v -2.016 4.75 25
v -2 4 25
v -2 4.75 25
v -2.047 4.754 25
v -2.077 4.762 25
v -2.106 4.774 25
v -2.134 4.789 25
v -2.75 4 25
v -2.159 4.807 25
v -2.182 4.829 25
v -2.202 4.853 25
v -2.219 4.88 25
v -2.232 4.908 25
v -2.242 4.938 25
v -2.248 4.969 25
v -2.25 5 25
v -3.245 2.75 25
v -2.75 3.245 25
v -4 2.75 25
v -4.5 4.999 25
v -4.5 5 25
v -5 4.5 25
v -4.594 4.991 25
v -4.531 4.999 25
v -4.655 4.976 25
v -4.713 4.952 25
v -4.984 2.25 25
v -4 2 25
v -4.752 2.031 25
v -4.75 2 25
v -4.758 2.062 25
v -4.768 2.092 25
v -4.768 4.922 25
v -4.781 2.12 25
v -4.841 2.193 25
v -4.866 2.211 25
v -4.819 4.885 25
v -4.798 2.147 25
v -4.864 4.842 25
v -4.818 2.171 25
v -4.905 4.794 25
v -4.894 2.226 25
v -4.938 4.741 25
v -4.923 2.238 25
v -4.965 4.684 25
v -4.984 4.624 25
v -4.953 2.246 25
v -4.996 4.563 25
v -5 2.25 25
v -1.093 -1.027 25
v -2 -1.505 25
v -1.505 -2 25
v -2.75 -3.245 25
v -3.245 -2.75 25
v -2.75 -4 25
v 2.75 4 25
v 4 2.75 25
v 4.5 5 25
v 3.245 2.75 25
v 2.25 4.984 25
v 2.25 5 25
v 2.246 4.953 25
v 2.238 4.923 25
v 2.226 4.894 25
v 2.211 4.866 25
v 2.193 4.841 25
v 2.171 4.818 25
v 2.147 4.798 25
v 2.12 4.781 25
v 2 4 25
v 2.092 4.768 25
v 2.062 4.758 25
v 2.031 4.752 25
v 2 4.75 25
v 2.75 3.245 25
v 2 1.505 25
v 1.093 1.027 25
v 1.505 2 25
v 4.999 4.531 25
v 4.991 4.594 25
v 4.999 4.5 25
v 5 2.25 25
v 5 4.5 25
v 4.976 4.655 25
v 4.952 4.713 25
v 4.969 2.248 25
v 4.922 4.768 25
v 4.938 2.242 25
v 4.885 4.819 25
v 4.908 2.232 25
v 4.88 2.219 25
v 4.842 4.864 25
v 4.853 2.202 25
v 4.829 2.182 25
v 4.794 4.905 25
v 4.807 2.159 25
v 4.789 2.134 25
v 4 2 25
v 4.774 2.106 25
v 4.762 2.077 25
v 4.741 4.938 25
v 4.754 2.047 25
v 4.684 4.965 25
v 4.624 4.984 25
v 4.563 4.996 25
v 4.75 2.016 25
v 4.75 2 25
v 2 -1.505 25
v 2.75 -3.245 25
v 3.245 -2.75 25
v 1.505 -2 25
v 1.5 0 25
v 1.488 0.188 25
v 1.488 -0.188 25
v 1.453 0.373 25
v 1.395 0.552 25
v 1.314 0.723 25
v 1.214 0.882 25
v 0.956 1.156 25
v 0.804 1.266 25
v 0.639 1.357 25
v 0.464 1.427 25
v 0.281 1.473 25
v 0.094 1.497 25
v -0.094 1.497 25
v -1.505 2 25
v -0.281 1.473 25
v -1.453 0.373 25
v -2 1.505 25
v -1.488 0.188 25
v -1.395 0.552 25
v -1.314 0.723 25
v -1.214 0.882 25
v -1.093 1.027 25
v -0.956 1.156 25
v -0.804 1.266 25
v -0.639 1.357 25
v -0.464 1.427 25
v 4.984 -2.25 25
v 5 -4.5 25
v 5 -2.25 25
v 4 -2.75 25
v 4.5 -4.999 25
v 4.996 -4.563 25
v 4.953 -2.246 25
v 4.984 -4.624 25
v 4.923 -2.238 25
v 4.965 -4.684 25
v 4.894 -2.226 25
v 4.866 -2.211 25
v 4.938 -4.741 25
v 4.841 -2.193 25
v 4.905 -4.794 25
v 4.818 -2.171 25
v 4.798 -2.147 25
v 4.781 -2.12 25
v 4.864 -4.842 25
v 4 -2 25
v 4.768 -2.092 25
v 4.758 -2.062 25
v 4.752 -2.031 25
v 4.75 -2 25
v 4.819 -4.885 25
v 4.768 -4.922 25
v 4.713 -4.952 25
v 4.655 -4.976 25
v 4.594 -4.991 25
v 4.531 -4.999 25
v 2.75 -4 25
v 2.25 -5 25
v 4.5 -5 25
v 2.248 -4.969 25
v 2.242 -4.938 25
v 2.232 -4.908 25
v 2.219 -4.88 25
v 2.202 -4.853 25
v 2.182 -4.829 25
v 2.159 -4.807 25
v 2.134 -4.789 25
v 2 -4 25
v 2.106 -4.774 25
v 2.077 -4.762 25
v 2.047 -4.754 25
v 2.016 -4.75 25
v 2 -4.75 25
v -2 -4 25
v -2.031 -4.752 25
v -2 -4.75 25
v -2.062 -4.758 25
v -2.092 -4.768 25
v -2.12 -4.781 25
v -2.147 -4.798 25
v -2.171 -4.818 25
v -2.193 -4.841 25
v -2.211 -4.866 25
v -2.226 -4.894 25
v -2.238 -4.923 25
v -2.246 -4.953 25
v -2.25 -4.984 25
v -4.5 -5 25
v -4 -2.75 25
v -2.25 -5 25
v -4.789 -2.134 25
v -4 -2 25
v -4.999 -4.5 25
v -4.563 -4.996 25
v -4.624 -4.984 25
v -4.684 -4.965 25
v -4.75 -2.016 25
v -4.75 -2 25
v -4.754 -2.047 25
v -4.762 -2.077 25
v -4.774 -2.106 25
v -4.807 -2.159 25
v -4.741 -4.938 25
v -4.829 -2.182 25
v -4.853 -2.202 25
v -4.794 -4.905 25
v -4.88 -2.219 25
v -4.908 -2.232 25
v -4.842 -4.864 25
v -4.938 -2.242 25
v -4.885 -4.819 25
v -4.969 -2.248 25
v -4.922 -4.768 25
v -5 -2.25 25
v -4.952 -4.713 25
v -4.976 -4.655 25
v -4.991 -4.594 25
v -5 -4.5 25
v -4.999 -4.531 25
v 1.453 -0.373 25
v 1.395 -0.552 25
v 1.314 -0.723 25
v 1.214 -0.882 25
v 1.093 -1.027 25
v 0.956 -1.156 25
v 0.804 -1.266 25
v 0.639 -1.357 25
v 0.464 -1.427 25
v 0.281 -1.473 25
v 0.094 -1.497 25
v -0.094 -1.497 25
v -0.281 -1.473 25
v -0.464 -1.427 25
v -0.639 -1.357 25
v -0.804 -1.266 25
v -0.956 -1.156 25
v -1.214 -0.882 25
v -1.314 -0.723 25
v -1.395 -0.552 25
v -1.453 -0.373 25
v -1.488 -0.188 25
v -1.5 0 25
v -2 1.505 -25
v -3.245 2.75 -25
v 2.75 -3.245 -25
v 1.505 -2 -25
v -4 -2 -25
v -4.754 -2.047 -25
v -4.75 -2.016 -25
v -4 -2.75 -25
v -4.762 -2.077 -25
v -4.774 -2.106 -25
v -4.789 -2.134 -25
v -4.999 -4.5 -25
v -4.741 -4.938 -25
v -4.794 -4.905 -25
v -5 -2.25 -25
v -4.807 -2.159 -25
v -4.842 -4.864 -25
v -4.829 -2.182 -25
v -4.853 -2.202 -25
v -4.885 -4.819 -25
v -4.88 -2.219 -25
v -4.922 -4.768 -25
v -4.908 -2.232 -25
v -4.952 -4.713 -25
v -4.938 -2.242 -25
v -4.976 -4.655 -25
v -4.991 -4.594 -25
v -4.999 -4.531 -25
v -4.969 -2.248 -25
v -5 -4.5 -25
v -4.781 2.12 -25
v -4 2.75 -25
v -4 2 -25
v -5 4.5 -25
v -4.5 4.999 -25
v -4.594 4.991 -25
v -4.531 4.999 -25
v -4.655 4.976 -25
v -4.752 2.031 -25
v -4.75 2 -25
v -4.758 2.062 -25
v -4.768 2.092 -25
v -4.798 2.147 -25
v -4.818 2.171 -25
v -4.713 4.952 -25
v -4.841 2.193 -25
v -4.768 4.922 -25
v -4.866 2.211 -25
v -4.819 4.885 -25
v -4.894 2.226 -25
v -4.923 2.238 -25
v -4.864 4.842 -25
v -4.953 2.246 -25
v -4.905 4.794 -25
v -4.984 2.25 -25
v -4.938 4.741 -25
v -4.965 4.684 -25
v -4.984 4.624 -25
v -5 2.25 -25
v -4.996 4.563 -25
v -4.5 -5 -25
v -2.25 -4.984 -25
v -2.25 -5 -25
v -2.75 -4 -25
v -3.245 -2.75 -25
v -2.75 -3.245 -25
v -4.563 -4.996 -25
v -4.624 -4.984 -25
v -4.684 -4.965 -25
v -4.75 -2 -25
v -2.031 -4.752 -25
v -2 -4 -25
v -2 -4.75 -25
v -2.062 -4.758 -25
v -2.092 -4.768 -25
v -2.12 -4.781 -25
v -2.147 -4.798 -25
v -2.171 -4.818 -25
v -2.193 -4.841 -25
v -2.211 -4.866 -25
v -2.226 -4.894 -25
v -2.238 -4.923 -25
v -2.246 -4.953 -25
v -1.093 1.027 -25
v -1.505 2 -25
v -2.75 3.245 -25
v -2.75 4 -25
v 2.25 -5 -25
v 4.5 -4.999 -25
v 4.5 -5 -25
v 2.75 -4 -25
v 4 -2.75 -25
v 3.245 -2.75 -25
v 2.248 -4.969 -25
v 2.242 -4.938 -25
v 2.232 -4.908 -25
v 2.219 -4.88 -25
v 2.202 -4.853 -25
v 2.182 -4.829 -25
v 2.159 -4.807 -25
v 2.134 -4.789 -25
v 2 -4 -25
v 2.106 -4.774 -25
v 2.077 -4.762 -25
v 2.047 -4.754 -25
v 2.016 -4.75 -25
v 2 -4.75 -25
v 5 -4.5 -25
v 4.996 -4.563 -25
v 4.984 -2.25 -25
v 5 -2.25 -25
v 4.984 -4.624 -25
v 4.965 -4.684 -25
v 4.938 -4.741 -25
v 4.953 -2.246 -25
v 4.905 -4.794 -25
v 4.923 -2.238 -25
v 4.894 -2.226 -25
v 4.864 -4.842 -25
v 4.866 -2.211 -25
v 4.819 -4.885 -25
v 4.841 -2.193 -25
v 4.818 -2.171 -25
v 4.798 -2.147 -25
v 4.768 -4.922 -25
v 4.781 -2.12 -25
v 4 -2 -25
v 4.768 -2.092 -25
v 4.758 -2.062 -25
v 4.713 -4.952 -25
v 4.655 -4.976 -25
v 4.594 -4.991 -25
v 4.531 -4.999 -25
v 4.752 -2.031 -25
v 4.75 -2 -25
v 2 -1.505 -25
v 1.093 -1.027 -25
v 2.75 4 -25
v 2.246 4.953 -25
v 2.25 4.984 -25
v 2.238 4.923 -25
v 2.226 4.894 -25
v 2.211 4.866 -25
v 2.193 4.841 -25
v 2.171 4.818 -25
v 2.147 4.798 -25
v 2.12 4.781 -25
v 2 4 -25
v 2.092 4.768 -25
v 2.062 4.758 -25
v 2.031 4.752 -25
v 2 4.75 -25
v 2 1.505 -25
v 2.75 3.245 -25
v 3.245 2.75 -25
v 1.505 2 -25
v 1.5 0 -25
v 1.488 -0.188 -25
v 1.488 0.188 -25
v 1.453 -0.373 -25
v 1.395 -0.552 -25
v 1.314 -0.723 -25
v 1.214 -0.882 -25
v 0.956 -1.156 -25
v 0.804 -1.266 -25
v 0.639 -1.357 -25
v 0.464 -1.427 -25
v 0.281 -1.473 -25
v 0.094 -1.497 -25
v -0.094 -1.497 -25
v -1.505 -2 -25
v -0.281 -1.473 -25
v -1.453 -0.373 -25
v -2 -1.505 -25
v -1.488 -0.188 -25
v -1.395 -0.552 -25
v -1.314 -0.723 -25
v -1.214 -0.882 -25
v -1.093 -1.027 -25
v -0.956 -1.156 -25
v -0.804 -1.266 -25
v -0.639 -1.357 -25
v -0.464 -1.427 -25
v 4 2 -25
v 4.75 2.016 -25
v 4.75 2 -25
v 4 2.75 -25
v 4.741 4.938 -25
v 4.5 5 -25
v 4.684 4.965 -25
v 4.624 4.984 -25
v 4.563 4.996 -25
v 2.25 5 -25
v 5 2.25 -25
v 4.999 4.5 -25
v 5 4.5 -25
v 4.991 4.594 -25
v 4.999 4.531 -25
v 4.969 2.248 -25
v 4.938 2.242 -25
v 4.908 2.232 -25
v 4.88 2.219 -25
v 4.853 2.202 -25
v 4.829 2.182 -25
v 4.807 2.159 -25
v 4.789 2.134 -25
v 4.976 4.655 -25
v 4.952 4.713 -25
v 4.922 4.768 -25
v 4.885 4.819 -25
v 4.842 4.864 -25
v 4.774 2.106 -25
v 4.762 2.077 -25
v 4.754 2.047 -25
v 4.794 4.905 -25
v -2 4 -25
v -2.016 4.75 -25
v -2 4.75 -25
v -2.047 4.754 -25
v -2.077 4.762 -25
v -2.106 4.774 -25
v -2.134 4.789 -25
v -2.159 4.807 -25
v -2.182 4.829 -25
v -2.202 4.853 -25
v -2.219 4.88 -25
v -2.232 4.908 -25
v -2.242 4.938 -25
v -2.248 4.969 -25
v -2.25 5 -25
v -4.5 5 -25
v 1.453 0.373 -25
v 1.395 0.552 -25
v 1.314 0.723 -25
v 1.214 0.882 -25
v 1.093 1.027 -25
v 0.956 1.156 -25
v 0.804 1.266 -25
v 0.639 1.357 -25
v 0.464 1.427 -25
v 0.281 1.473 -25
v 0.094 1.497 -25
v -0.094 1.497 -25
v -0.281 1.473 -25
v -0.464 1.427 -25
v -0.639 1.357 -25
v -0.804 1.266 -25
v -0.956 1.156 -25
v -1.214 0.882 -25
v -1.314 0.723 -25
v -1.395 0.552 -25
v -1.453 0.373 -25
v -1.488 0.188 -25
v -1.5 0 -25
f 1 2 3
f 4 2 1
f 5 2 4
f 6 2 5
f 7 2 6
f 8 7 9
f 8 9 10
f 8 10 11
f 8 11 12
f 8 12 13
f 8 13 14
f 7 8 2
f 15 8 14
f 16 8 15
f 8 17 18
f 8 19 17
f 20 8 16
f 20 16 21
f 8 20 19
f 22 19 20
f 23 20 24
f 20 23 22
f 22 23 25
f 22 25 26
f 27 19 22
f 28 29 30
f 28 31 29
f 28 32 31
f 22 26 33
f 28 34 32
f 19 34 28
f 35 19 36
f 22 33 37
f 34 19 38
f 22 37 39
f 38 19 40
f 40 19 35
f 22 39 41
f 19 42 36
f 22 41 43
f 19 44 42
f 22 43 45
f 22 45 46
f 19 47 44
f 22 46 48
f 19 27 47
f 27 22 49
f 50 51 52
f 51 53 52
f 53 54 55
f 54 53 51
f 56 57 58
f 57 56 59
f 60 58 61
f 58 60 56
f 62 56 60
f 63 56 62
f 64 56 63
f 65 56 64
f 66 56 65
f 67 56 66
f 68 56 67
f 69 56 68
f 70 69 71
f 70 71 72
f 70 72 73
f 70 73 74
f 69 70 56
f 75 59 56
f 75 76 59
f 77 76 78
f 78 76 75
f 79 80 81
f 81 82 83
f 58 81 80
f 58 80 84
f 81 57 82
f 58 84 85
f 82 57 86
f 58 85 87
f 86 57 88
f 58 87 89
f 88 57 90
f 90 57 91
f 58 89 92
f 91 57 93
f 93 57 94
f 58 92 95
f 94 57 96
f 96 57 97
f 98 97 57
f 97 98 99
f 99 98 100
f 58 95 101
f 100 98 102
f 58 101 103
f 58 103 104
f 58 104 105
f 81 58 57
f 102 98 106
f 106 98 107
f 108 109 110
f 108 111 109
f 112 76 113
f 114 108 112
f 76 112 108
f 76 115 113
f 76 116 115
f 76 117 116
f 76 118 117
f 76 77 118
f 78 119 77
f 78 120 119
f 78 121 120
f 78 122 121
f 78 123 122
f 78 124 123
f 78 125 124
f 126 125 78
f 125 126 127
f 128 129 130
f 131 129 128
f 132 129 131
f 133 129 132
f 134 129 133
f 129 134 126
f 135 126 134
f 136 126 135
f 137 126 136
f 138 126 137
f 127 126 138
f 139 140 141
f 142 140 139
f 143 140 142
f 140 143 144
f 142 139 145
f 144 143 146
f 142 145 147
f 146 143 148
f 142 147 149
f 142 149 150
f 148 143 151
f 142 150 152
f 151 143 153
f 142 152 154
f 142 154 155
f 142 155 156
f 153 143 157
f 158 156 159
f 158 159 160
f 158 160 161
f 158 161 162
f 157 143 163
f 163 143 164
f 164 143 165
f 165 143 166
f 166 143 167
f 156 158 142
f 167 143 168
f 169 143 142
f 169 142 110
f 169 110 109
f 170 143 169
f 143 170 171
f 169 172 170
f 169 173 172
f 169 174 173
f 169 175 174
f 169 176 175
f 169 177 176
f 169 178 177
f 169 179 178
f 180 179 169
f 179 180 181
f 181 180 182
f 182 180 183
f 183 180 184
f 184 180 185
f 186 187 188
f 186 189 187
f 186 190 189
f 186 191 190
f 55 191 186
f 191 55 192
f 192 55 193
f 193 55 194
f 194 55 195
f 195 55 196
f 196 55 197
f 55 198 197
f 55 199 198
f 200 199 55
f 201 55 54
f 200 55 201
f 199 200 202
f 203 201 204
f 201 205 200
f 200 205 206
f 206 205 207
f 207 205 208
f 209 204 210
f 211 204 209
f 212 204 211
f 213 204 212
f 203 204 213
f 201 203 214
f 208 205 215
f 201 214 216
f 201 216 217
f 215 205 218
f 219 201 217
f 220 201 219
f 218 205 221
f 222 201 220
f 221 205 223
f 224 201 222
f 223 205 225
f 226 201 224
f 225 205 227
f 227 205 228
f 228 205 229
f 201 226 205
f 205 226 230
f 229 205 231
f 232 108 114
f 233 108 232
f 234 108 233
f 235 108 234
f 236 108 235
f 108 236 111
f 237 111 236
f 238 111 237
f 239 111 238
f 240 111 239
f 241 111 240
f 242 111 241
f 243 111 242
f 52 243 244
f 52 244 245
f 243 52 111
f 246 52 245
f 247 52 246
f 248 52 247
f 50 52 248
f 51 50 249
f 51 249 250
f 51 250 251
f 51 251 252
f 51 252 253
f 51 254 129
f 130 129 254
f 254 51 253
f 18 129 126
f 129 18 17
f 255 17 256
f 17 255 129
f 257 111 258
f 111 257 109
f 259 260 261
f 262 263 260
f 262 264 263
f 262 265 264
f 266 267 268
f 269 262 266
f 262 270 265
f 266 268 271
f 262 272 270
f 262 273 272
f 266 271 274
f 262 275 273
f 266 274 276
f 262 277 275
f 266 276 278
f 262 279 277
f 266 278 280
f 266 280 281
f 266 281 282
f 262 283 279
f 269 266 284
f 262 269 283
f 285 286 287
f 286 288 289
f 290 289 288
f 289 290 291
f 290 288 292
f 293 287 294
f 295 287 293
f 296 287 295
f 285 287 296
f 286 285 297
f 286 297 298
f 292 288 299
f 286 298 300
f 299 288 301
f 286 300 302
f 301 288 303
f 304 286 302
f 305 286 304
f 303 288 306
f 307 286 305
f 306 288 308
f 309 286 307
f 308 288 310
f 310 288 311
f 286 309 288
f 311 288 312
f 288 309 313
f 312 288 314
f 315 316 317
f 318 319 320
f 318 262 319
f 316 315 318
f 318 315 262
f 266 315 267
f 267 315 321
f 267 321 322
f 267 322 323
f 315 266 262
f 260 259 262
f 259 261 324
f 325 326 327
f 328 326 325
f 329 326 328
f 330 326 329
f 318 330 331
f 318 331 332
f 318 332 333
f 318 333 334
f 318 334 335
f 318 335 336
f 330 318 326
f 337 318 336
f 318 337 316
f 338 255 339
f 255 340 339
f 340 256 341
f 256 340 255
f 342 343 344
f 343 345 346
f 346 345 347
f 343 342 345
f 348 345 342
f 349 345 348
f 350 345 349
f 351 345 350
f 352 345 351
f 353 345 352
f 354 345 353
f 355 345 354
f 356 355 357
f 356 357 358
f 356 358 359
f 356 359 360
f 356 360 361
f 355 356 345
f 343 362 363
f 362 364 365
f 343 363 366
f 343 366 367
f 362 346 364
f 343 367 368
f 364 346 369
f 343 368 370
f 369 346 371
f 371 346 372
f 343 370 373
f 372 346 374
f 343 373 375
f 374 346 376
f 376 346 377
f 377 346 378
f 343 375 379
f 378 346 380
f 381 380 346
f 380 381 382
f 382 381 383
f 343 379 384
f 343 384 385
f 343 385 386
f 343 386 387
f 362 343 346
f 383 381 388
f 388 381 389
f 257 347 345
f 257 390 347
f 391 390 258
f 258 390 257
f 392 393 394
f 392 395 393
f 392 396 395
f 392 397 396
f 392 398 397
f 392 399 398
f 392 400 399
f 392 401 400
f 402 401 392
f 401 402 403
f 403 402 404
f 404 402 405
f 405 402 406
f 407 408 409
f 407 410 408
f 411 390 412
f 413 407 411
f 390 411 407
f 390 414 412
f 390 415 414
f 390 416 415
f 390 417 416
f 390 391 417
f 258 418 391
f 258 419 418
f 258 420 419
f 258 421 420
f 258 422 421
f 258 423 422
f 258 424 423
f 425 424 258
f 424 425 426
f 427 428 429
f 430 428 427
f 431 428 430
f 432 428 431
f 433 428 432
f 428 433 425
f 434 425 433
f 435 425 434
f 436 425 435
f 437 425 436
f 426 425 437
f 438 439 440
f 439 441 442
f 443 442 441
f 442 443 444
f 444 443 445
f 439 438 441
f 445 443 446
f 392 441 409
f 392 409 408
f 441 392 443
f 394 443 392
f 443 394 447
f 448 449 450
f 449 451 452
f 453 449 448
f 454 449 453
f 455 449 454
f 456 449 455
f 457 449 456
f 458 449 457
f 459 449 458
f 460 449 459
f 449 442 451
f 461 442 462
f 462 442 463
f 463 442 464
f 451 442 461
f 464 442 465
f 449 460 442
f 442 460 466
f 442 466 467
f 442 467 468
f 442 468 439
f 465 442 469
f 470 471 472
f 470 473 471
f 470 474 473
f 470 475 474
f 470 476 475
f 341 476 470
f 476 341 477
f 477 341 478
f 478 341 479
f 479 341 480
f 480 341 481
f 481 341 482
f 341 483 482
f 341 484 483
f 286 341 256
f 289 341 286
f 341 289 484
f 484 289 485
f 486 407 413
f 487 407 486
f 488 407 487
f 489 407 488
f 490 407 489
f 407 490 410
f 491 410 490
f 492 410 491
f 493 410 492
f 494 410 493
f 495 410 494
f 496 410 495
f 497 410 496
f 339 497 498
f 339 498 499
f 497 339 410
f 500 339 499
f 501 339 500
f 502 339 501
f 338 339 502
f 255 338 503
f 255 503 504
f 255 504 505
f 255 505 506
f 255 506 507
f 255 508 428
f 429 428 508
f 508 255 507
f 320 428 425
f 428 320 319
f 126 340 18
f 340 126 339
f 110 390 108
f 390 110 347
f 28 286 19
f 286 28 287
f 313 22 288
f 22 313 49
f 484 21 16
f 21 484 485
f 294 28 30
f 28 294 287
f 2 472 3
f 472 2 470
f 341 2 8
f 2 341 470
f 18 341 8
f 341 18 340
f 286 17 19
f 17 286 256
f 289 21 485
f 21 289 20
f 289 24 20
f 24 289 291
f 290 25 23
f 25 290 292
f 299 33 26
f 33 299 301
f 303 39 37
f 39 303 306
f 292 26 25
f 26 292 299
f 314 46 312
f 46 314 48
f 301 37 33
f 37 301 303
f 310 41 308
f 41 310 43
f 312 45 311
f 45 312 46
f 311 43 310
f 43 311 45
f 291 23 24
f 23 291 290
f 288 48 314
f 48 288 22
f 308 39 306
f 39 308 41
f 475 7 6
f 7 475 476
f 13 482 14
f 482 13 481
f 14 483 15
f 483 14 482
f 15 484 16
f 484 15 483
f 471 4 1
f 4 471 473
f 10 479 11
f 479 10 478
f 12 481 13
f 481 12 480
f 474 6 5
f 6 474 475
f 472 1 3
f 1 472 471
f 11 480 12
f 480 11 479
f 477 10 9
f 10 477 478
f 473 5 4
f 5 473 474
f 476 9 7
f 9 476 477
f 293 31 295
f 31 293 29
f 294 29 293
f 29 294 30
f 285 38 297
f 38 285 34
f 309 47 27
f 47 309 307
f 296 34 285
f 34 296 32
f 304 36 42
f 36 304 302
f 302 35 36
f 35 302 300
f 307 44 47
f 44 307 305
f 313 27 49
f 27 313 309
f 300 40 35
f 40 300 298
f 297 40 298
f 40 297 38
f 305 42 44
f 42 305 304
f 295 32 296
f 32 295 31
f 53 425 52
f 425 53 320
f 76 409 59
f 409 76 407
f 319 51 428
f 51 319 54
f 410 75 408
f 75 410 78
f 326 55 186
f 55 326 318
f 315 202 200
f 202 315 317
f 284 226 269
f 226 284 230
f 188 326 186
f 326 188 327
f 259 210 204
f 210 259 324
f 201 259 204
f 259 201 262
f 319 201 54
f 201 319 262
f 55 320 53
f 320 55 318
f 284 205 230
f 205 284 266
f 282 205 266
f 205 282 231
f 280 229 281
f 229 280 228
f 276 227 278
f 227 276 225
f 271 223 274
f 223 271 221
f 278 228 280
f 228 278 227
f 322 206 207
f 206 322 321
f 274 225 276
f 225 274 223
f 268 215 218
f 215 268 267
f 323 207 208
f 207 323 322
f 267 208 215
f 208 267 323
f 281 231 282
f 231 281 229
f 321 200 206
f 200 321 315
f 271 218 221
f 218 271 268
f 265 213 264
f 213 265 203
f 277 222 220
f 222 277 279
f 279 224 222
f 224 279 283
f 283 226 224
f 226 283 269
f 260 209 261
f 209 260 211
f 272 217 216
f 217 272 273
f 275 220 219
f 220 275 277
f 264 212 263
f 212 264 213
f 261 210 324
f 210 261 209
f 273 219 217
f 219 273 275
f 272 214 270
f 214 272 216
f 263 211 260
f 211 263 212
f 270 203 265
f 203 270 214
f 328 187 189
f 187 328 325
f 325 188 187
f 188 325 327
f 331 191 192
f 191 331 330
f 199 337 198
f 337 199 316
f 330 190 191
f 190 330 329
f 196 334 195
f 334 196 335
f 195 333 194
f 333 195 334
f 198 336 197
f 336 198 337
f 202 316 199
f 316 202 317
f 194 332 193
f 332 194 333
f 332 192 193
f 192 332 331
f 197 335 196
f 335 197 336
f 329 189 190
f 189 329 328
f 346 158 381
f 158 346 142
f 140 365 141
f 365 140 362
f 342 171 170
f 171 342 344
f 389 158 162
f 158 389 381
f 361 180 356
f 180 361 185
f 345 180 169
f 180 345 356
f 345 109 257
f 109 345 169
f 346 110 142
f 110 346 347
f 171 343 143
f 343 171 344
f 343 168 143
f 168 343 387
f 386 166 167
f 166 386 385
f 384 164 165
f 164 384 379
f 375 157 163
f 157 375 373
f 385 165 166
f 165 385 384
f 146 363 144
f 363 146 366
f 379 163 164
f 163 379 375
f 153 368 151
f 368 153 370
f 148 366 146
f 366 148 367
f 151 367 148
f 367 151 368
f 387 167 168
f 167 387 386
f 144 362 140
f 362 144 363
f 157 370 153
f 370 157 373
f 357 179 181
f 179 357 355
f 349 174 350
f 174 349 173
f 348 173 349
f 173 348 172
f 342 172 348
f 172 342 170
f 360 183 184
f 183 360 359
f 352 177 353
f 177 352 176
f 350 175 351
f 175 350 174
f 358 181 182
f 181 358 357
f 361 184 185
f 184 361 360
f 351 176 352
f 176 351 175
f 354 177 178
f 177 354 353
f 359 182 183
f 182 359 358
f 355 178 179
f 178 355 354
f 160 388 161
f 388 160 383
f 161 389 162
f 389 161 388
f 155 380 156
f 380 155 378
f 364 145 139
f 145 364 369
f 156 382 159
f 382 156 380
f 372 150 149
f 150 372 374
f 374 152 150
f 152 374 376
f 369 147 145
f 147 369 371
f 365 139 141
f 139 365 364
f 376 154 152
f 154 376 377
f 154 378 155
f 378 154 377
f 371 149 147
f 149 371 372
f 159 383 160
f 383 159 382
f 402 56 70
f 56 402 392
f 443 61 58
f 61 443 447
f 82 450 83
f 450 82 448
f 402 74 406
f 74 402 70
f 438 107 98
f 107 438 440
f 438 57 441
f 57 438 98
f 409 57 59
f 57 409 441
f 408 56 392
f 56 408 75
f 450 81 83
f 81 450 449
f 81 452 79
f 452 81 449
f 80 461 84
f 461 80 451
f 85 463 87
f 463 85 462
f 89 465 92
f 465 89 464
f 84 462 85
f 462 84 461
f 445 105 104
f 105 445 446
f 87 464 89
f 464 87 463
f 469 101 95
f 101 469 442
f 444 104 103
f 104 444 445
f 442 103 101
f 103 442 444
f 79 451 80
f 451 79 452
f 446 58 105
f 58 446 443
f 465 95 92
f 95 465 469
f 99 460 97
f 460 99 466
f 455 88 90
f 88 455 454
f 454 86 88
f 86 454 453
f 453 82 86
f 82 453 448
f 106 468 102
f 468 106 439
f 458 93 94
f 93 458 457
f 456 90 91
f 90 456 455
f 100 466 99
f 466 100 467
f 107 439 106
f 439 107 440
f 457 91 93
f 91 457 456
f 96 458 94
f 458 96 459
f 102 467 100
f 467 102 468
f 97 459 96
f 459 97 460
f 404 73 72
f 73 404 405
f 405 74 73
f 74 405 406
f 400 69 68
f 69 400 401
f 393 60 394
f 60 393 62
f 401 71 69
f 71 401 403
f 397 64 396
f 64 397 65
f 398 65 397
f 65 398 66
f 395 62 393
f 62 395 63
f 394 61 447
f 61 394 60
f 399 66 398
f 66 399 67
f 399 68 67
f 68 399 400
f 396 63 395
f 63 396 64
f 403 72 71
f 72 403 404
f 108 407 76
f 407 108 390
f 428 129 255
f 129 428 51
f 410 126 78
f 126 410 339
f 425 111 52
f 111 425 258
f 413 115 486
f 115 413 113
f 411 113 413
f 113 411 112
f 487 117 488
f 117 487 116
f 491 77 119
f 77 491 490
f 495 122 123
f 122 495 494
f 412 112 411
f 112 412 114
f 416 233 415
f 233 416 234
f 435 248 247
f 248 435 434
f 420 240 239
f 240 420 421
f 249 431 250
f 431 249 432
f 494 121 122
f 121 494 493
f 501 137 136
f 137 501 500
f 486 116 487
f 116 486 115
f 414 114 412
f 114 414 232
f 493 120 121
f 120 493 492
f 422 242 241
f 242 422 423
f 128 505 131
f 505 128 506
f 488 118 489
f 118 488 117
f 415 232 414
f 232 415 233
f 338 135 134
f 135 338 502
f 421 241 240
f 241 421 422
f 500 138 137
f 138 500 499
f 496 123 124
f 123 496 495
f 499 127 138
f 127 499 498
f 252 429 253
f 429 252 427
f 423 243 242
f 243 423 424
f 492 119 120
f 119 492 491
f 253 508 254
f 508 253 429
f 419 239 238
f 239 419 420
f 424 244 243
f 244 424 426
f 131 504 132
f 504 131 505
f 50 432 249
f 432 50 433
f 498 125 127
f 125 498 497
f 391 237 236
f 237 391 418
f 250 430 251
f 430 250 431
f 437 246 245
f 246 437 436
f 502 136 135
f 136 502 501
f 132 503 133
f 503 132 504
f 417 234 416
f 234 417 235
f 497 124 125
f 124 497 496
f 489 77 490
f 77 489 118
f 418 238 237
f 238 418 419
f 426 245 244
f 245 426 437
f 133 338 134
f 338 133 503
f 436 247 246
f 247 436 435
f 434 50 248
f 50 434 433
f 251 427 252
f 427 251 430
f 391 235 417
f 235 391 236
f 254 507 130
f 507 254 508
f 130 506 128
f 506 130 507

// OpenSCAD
// Adapted from https://thingiverse-production-new.s3.amazonaws.com/assets/75/6e/cf/b4/45/makerBeam.scad
$fn=50;

module makerBeam(length)
{
	difference(){
		union(){
			// body
			cube([4,4,length], center=true);
			// corners
			for (i=[0:3]){
				rotate([0, 0, i*90]){corner(length);}
			}
		}
		// center hole
		cylinder(h=length, r=1.5, center=true);
	};
}

module corner(length){
	difference(){
		union(){
			// arm
			rotate([0, 0, 45]){
				translate([0,2.5,0]){cube([.7, 7.5, length], center=true);}
			}

			translate([-4.5, 3.5, 0]){cube([1, 3, length], center=true);}
			translate([-3.5, 4.5, 0]){cube([3, 1, length], center=true);}
			translate([-3.5, 3.5, 0]){cube([1.5, 1.5, length], center=true);}
		}

		translate([-2, 5, 0]){cylinder(h=length, r=0.25, center=true);}
		translate([-5, 2, 0]){cylinder(h=length, r=0.25, center=true);}

		// round external shape
		difference(){
			translate([-4.75, 4.75, 0]){cube([.5, .5, length], center=true);}
			translate([-4.5, 4.5, 0]){cylinder(h=length, r=.5, center=true);}
		}
	}
}


makerBeam(50);
